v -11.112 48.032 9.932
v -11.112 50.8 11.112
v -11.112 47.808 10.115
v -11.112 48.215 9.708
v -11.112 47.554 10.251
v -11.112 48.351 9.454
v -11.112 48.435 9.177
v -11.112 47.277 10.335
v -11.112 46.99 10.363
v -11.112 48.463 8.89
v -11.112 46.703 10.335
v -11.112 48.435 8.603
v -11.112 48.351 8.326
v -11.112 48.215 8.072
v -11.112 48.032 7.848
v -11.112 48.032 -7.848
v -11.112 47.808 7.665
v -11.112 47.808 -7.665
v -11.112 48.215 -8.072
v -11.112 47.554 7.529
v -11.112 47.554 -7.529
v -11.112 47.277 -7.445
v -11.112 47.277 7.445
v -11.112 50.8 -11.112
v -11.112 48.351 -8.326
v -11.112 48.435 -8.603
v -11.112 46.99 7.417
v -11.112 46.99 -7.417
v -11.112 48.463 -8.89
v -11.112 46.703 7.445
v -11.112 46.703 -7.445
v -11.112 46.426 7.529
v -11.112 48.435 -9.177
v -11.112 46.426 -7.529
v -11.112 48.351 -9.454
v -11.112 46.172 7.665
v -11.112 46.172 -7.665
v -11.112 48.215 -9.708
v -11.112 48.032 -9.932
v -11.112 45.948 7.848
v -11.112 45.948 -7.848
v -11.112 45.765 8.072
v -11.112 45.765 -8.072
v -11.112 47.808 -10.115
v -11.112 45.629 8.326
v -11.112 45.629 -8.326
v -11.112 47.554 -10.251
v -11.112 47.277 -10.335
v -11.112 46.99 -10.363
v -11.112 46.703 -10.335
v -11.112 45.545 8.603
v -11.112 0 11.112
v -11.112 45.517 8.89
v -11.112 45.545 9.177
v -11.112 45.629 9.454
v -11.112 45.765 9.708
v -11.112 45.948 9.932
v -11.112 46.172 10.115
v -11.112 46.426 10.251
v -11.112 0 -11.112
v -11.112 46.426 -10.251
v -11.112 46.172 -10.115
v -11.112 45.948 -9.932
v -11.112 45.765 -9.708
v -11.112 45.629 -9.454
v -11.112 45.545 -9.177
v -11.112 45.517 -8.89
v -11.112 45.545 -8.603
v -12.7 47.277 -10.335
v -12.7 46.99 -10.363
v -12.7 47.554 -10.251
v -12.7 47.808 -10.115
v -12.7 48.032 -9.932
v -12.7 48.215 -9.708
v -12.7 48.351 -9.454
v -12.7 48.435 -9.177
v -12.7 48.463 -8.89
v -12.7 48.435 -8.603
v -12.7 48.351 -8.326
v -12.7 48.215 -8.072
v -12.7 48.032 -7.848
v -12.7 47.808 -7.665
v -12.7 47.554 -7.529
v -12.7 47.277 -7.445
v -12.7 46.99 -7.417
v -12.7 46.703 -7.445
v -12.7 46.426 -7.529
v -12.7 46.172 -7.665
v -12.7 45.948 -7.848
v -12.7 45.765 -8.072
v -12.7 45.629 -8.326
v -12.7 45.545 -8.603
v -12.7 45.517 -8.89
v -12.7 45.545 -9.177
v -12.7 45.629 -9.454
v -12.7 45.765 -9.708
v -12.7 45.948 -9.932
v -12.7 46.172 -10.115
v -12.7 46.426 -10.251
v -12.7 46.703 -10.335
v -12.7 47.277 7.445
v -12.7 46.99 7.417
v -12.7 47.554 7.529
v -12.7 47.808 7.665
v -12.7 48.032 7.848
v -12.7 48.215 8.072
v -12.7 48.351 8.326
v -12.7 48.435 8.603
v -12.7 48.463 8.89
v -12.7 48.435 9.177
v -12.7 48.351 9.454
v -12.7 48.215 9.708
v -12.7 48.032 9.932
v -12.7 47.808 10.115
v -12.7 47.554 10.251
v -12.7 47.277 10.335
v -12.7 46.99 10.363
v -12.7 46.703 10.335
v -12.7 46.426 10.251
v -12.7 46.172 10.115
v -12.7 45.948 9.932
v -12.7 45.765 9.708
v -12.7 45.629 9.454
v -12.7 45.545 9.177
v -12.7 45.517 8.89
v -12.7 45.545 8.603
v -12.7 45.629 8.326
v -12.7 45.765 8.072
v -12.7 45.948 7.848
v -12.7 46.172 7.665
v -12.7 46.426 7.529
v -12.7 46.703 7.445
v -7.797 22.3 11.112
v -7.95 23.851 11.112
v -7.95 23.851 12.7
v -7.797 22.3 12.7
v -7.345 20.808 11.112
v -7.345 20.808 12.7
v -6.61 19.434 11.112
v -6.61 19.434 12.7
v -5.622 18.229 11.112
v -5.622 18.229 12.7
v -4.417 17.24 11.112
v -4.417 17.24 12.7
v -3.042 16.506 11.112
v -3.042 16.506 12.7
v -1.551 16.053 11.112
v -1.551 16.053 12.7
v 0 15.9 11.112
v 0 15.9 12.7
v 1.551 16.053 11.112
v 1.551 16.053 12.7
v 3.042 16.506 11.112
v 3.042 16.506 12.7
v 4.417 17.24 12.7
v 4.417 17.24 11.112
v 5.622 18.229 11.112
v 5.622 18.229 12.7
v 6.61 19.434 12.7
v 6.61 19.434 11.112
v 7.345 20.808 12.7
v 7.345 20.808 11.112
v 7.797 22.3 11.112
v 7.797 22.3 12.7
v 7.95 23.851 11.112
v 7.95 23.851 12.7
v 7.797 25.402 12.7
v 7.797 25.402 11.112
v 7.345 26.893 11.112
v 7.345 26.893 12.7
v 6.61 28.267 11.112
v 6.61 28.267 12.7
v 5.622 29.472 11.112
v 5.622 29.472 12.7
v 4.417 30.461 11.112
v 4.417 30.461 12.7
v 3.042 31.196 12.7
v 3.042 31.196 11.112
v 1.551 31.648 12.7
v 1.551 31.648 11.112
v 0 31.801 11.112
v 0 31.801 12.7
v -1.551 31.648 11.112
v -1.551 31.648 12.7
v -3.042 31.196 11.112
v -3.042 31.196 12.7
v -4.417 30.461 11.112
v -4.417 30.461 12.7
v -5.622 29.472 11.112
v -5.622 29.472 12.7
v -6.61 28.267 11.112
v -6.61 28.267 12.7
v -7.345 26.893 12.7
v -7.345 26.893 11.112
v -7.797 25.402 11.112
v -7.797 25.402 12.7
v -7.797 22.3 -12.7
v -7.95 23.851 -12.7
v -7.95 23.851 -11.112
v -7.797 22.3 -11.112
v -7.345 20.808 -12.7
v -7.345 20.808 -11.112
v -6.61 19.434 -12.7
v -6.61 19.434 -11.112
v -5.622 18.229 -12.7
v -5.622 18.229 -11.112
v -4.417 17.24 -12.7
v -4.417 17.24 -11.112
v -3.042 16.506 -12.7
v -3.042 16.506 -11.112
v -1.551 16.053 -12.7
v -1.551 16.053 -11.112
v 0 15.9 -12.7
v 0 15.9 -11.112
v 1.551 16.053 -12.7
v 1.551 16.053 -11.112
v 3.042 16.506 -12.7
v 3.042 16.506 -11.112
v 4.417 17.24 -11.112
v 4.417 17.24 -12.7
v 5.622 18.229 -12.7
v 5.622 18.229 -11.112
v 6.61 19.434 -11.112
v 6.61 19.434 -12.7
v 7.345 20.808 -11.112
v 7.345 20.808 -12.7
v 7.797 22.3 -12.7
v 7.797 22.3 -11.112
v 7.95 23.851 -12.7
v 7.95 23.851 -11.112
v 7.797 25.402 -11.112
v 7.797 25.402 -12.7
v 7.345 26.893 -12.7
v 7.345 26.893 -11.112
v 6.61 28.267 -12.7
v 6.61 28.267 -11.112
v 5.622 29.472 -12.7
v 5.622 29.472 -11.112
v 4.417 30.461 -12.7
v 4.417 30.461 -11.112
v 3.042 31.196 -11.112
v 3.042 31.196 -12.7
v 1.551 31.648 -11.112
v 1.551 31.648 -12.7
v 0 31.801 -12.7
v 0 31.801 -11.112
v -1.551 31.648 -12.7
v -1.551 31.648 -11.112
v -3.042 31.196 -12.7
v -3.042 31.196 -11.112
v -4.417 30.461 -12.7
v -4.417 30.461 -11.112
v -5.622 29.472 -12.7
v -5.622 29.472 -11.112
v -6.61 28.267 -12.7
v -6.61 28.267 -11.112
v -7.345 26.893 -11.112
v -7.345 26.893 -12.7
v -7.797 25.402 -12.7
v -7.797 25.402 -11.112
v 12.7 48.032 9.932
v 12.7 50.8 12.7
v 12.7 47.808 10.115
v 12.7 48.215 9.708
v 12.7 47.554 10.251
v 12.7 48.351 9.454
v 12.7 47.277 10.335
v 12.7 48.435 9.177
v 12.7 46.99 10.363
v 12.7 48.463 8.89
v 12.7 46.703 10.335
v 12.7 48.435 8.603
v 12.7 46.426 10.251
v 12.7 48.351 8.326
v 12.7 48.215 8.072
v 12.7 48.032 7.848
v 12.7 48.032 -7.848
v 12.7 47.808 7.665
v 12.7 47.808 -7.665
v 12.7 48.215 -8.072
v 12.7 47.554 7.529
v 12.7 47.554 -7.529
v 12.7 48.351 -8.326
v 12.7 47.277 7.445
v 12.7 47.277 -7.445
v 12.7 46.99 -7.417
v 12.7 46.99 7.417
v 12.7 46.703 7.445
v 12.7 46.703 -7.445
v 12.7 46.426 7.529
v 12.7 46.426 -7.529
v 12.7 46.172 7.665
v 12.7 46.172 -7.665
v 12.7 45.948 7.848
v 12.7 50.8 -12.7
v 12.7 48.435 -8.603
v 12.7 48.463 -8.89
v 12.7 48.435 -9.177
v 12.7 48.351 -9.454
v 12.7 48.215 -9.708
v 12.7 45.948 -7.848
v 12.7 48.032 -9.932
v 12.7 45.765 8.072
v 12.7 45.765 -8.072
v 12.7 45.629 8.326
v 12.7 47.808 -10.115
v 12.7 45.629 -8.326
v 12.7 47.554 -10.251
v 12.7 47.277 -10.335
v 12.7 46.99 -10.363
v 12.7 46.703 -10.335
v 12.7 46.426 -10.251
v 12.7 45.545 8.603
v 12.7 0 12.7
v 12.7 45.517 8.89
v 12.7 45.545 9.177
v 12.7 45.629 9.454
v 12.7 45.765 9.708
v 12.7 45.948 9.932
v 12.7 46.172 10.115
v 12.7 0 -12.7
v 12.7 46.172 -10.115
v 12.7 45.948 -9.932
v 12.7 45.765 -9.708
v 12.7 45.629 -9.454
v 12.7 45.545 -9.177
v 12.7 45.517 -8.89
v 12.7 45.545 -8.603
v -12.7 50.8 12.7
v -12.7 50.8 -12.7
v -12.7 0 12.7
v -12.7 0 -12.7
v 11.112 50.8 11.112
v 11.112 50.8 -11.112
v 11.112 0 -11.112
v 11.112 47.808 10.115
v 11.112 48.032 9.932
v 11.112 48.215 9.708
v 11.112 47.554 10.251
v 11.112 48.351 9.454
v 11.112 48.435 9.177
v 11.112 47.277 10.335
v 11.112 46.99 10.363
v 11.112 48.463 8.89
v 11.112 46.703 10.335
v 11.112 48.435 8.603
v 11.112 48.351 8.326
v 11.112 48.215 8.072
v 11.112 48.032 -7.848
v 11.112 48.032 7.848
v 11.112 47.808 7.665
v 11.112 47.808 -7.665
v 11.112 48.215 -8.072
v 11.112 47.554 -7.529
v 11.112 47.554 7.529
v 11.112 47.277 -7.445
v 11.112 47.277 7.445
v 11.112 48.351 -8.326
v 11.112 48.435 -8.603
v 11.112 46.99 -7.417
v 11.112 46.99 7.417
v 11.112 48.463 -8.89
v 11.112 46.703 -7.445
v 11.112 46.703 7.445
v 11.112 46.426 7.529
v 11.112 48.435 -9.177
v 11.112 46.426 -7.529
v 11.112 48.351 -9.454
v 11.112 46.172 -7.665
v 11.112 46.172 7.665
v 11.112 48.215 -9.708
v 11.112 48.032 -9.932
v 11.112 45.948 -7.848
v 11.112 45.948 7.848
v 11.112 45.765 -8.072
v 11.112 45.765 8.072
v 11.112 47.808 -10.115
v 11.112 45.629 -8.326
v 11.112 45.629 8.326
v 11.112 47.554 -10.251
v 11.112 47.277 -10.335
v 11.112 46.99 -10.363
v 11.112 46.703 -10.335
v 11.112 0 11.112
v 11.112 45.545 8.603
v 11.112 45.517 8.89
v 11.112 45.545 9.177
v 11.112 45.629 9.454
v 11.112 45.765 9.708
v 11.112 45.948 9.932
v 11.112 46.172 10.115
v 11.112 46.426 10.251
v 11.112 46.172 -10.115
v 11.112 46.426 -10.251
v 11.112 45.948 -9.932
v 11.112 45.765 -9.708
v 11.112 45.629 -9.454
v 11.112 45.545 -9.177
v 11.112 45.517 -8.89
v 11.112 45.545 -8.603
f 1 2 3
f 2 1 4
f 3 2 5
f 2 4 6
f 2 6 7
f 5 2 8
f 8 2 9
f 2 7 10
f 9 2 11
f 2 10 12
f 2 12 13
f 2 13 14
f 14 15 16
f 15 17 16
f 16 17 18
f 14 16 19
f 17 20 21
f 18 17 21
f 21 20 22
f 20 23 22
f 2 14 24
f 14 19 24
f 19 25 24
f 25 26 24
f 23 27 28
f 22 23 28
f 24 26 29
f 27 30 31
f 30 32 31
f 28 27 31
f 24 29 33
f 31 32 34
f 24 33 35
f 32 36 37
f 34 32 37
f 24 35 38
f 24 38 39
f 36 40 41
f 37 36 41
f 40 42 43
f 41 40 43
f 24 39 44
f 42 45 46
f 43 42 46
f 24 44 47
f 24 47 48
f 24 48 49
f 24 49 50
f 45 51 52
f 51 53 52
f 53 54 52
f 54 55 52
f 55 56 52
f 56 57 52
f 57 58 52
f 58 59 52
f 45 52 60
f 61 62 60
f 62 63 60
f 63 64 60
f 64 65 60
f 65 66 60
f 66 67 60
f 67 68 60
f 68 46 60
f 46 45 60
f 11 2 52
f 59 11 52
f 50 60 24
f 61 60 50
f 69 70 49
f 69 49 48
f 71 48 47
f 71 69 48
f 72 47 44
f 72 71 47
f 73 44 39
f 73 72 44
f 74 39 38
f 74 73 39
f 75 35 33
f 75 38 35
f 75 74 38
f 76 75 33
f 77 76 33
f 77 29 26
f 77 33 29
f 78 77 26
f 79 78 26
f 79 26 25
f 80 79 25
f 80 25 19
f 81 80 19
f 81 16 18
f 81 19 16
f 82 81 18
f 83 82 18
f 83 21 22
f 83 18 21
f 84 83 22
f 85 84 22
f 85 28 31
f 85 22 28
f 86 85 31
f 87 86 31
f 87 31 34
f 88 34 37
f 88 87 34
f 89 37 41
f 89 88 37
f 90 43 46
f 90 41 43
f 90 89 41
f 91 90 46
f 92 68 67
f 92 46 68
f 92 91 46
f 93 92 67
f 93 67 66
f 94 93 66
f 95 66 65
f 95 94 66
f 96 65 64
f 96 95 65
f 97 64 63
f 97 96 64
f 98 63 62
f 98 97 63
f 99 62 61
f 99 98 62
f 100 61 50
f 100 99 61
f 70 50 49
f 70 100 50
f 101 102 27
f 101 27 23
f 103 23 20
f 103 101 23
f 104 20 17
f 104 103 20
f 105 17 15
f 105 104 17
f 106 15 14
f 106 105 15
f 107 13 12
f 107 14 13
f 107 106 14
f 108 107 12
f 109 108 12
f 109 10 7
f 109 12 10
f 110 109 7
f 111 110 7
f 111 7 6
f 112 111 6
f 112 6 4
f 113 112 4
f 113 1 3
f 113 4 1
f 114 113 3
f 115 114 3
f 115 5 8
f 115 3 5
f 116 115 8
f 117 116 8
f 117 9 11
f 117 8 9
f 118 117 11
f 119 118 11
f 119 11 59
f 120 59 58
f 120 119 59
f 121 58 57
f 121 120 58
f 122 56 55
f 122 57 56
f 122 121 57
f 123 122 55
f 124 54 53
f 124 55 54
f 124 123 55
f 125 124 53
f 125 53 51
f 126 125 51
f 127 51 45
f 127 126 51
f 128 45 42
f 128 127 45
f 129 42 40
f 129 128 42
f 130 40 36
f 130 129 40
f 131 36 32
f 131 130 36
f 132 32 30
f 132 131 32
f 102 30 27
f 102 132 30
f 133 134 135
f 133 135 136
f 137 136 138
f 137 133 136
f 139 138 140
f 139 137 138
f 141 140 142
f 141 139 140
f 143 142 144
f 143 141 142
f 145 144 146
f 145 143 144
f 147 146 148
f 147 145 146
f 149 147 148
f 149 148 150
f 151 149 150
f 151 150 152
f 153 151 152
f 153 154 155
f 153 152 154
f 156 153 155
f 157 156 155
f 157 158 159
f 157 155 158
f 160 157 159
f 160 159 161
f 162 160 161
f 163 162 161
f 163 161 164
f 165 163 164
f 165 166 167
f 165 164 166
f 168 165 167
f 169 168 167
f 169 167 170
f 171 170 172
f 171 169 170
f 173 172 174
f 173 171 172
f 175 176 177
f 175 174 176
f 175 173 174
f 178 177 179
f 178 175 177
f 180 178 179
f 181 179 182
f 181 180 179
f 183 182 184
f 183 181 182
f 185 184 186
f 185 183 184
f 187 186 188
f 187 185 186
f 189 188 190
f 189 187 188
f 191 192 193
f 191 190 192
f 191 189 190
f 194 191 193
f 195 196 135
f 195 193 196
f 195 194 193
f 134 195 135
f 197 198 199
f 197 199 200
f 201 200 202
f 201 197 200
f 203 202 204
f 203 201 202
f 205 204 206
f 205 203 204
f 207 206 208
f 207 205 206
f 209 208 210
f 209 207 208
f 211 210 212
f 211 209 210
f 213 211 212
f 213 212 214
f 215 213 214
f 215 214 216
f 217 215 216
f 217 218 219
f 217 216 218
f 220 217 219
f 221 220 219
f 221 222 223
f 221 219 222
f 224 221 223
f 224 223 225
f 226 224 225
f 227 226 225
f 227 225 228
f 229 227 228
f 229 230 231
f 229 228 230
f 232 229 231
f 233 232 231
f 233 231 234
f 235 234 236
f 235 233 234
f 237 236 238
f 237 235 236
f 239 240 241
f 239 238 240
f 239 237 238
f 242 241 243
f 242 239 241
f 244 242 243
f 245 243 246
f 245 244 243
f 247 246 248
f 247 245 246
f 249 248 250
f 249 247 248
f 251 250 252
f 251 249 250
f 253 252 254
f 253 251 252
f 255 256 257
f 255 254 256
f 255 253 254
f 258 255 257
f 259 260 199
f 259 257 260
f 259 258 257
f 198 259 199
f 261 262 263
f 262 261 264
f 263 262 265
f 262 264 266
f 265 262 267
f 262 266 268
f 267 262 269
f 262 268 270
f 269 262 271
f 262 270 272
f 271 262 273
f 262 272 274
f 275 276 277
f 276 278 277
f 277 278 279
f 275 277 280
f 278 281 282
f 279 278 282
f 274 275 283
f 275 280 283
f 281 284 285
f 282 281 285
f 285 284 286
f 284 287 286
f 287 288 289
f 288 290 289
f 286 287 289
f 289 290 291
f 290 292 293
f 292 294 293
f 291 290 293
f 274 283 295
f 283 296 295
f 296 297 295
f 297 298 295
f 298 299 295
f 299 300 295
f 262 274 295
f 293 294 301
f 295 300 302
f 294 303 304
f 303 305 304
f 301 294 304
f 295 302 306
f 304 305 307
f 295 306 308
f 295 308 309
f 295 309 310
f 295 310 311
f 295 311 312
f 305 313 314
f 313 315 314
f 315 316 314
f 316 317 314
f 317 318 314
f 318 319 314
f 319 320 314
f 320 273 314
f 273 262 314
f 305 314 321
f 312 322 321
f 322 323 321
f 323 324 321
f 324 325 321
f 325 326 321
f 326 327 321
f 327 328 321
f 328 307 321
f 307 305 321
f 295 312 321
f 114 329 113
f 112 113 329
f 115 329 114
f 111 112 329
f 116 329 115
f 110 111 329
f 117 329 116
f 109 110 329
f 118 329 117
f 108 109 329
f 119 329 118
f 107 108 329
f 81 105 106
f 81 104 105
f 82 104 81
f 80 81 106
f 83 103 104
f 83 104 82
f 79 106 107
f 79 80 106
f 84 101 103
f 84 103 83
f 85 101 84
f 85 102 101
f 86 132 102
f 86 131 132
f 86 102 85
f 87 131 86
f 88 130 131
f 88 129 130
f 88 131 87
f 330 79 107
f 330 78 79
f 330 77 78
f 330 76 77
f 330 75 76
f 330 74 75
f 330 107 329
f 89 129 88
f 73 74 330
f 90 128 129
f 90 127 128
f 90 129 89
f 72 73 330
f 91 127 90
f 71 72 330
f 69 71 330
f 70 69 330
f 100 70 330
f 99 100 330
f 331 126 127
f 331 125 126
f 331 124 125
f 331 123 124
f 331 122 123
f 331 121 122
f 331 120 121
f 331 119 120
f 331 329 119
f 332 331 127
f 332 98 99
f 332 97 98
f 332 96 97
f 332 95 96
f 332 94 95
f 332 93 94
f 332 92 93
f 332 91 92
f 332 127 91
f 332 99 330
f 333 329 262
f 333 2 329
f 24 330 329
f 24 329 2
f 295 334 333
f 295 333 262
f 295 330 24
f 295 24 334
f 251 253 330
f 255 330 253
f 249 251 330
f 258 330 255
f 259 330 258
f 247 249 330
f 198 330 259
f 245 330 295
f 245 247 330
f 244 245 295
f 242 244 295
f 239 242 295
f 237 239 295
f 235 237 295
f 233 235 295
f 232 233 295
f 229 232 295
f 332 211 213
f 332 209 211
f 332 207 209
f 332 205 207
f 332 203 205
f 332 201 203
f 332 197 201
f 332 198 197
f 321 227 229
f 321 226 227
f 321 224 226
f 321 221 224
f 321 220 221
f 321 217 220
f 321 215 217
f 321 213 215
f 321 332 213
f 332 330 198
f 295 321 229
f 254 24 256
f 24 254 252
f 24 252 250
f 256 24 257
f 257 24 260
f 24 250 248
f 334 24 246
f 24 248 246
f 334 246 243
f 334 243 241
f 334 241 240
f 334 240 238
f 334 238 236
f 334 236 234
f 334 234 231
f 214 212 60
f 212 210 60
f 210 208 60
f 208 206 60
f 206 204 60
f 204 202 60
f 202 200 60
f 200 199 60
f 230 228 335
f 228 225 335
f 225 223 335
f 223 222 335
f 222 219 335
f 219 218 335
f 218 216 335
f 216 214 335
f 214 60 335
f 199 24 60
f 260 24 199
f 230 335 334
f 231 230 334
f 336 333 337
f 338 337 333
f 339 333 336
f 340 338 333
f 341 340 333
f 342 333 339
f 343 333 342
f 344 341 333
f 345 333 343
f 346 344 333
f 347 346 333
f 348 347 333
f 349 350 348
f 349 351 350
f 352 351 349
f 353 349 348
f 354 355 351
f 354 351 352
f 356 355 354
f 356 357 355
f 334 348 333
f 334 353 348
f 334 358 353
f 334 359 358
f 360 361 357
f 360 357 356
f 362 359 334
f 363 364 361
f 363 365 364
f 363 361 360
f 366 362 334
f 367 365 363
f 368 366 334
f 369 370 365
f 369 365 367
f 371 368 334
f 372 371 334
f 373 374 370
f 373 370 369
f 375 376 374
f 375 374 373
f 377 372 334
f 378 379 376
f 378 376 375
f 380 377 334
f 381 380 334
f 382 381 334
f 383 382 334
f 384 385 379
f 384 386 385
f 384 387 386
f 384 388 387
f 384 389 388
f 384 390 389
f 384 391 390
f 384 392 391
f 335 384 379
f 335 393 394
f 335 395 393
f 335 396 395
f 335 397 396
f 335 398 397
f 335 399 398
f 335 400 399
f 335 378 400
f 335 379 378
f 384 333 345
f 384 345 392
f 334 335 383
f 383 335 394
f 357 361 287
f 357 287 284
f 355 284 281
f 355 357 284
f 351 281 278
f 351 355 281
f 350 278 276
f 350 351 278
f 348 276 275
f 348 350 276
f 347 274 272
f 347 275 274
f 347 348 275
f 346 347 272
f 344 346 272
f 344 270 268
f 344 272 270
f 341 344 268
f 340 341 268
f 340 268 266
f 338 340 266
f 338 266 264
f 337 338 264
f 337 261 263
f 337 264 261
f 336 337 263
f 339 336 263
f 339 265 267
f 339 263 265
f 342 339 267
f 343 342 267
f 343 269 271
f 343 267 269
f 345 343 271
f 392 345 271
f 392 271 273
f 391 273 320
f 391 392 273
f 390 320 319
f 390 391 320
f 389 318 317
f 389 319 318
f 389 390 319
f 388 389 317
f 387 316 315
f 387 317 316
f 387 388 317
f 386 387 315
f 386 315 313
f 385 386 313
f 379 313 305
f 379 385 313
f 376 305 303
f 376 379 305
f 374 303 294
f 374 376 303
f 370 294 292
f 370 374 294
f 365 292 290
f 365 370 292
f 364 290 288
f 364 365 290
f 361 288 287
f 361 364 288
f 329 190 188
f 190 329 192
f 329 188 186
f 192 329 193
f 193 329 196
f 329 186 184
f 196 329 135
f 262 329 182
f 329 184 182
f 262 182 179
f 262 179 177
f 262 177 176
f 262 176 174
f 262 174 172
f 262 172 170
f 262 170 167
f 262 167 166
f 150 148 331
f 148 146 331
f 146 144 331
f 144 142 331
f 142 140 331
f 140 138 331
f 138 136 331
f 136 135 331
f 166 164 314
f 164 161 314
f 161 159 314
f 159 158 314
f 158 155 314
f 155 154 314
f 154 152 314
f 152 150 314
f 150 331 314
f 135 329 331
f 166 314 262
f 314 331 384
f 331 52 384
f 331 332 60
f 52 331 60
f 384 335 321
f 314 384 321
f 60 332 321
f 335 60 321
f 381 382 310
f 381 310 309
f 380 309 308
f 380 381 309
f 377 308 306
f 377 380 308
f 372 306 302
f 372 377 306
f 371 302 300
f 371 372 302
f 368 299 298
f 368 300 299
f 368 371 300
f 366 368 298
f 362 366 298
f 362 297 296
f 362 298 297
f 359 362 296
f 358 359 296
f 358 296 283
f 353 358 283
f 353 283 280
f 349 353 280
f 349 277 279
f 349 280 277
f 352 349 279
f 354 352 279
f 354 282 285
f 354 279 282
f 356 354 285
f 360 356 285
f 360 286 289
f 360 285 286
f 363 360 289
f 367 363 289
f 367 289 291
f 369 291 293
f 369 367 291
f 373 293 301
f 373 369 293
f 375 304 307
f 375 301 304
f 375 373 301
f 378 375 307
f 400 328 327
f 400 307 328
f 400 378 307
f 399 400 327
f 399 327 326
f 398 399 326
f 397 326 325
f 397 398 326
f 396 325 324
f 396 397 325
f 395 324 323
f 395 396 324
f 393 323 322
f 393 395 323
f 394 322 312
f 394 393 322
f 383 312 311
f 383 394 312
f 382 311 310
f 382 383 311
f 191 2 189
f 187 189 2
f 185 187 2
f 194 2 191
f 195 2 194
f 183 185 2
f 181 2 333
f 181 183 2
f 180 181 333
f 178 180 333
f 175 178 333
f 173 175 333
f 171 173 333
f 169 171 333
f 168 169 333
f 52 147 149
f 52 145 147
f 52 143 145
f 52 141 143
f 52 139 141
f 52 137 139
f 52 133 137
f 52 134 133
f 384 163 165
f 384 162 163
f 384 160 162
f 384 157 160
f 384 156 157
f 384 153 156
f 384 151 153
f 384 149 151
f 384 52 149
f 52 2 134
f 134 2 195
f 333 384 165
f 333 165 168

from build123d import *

# Parameters (mm, degrees)
SKETCH1_W               = 25.4
SKETCH1_H               = 25.4
SKETCH1_W_2             = 22.225
SKETCH1_H_2             = 22.225
BOSS_EXTRUDE1_DEPTH     = 50.8
CUT_EXTRUDE1_DEPTH      = 59.198711326
CUT_EXTRUDE1_DEPTH_BACK = 59.198711326
SKETCH2_R               = 7.9502
CUT_EXTRUDE2_DEPTH      = 59.198711326
CUT_EXTRUDE2_DEPTH_BACK = 59.198711326
SKETCH3_R               = 1.4732


with BuildPart() as part:
    # Sketch1 → Boss-Extrude1 (new body)
    with BuildSketch(Plane(origin=(0, 0, 0), x_dir=(1, 0, 0), z_dir=(0, 1, 0))):
        Rectangle(SKETCH1_W, SKETCH1_H)
        Rectangle(SKETCH1_W_2, SKETCH1_H_2, mode=Mode.SUBTRACT)
    extrude(amount=BOSS_EXTRUDE1_DEPTH)

    # Sketch2 → Cut-Extrude1 (cut, two sides: drawn at the far end of the back side and taken through both)
    with BuildSketch(Plane.XY.offset(12.7).offset(-CUT_EXTRUDE1_DEPTH_BACK)):
        with Locations(Location((0, 23.8506, 0), (0, 0, 180))):
            Circle(SKETCH2_R)
    extrude(amount=CUT_EXTRUDE1_DEPTH + CUT_EXTRUDE1_DEPTH_BACK, mode=Mode.SUBTRACT)

    # Sketch3 → Cut-Extrude2 (cut, two sides: drawn at the far end of the back side and taken through both)
    with BuildSketch(Plane(origin=(12.7, 0, 0), x_dir=(0, 0, -1), z_dir=(1, 0, 0)).offset(-CUT_EXTRUDE2_DEPTH_BACK)):
        with Locations((-8.89, 46.99)):
            Circle(SKETCH3_R)
        with Locations((8.89, 46.99)):
            Circle(SKETCH3_R)
    extrude(amount=CUT_EXTRUDE2_DEPTH + CUT_EXTRUDE2_DEPTH_BACK, mode=Mode.SUBTRACT)


solid = part.part
